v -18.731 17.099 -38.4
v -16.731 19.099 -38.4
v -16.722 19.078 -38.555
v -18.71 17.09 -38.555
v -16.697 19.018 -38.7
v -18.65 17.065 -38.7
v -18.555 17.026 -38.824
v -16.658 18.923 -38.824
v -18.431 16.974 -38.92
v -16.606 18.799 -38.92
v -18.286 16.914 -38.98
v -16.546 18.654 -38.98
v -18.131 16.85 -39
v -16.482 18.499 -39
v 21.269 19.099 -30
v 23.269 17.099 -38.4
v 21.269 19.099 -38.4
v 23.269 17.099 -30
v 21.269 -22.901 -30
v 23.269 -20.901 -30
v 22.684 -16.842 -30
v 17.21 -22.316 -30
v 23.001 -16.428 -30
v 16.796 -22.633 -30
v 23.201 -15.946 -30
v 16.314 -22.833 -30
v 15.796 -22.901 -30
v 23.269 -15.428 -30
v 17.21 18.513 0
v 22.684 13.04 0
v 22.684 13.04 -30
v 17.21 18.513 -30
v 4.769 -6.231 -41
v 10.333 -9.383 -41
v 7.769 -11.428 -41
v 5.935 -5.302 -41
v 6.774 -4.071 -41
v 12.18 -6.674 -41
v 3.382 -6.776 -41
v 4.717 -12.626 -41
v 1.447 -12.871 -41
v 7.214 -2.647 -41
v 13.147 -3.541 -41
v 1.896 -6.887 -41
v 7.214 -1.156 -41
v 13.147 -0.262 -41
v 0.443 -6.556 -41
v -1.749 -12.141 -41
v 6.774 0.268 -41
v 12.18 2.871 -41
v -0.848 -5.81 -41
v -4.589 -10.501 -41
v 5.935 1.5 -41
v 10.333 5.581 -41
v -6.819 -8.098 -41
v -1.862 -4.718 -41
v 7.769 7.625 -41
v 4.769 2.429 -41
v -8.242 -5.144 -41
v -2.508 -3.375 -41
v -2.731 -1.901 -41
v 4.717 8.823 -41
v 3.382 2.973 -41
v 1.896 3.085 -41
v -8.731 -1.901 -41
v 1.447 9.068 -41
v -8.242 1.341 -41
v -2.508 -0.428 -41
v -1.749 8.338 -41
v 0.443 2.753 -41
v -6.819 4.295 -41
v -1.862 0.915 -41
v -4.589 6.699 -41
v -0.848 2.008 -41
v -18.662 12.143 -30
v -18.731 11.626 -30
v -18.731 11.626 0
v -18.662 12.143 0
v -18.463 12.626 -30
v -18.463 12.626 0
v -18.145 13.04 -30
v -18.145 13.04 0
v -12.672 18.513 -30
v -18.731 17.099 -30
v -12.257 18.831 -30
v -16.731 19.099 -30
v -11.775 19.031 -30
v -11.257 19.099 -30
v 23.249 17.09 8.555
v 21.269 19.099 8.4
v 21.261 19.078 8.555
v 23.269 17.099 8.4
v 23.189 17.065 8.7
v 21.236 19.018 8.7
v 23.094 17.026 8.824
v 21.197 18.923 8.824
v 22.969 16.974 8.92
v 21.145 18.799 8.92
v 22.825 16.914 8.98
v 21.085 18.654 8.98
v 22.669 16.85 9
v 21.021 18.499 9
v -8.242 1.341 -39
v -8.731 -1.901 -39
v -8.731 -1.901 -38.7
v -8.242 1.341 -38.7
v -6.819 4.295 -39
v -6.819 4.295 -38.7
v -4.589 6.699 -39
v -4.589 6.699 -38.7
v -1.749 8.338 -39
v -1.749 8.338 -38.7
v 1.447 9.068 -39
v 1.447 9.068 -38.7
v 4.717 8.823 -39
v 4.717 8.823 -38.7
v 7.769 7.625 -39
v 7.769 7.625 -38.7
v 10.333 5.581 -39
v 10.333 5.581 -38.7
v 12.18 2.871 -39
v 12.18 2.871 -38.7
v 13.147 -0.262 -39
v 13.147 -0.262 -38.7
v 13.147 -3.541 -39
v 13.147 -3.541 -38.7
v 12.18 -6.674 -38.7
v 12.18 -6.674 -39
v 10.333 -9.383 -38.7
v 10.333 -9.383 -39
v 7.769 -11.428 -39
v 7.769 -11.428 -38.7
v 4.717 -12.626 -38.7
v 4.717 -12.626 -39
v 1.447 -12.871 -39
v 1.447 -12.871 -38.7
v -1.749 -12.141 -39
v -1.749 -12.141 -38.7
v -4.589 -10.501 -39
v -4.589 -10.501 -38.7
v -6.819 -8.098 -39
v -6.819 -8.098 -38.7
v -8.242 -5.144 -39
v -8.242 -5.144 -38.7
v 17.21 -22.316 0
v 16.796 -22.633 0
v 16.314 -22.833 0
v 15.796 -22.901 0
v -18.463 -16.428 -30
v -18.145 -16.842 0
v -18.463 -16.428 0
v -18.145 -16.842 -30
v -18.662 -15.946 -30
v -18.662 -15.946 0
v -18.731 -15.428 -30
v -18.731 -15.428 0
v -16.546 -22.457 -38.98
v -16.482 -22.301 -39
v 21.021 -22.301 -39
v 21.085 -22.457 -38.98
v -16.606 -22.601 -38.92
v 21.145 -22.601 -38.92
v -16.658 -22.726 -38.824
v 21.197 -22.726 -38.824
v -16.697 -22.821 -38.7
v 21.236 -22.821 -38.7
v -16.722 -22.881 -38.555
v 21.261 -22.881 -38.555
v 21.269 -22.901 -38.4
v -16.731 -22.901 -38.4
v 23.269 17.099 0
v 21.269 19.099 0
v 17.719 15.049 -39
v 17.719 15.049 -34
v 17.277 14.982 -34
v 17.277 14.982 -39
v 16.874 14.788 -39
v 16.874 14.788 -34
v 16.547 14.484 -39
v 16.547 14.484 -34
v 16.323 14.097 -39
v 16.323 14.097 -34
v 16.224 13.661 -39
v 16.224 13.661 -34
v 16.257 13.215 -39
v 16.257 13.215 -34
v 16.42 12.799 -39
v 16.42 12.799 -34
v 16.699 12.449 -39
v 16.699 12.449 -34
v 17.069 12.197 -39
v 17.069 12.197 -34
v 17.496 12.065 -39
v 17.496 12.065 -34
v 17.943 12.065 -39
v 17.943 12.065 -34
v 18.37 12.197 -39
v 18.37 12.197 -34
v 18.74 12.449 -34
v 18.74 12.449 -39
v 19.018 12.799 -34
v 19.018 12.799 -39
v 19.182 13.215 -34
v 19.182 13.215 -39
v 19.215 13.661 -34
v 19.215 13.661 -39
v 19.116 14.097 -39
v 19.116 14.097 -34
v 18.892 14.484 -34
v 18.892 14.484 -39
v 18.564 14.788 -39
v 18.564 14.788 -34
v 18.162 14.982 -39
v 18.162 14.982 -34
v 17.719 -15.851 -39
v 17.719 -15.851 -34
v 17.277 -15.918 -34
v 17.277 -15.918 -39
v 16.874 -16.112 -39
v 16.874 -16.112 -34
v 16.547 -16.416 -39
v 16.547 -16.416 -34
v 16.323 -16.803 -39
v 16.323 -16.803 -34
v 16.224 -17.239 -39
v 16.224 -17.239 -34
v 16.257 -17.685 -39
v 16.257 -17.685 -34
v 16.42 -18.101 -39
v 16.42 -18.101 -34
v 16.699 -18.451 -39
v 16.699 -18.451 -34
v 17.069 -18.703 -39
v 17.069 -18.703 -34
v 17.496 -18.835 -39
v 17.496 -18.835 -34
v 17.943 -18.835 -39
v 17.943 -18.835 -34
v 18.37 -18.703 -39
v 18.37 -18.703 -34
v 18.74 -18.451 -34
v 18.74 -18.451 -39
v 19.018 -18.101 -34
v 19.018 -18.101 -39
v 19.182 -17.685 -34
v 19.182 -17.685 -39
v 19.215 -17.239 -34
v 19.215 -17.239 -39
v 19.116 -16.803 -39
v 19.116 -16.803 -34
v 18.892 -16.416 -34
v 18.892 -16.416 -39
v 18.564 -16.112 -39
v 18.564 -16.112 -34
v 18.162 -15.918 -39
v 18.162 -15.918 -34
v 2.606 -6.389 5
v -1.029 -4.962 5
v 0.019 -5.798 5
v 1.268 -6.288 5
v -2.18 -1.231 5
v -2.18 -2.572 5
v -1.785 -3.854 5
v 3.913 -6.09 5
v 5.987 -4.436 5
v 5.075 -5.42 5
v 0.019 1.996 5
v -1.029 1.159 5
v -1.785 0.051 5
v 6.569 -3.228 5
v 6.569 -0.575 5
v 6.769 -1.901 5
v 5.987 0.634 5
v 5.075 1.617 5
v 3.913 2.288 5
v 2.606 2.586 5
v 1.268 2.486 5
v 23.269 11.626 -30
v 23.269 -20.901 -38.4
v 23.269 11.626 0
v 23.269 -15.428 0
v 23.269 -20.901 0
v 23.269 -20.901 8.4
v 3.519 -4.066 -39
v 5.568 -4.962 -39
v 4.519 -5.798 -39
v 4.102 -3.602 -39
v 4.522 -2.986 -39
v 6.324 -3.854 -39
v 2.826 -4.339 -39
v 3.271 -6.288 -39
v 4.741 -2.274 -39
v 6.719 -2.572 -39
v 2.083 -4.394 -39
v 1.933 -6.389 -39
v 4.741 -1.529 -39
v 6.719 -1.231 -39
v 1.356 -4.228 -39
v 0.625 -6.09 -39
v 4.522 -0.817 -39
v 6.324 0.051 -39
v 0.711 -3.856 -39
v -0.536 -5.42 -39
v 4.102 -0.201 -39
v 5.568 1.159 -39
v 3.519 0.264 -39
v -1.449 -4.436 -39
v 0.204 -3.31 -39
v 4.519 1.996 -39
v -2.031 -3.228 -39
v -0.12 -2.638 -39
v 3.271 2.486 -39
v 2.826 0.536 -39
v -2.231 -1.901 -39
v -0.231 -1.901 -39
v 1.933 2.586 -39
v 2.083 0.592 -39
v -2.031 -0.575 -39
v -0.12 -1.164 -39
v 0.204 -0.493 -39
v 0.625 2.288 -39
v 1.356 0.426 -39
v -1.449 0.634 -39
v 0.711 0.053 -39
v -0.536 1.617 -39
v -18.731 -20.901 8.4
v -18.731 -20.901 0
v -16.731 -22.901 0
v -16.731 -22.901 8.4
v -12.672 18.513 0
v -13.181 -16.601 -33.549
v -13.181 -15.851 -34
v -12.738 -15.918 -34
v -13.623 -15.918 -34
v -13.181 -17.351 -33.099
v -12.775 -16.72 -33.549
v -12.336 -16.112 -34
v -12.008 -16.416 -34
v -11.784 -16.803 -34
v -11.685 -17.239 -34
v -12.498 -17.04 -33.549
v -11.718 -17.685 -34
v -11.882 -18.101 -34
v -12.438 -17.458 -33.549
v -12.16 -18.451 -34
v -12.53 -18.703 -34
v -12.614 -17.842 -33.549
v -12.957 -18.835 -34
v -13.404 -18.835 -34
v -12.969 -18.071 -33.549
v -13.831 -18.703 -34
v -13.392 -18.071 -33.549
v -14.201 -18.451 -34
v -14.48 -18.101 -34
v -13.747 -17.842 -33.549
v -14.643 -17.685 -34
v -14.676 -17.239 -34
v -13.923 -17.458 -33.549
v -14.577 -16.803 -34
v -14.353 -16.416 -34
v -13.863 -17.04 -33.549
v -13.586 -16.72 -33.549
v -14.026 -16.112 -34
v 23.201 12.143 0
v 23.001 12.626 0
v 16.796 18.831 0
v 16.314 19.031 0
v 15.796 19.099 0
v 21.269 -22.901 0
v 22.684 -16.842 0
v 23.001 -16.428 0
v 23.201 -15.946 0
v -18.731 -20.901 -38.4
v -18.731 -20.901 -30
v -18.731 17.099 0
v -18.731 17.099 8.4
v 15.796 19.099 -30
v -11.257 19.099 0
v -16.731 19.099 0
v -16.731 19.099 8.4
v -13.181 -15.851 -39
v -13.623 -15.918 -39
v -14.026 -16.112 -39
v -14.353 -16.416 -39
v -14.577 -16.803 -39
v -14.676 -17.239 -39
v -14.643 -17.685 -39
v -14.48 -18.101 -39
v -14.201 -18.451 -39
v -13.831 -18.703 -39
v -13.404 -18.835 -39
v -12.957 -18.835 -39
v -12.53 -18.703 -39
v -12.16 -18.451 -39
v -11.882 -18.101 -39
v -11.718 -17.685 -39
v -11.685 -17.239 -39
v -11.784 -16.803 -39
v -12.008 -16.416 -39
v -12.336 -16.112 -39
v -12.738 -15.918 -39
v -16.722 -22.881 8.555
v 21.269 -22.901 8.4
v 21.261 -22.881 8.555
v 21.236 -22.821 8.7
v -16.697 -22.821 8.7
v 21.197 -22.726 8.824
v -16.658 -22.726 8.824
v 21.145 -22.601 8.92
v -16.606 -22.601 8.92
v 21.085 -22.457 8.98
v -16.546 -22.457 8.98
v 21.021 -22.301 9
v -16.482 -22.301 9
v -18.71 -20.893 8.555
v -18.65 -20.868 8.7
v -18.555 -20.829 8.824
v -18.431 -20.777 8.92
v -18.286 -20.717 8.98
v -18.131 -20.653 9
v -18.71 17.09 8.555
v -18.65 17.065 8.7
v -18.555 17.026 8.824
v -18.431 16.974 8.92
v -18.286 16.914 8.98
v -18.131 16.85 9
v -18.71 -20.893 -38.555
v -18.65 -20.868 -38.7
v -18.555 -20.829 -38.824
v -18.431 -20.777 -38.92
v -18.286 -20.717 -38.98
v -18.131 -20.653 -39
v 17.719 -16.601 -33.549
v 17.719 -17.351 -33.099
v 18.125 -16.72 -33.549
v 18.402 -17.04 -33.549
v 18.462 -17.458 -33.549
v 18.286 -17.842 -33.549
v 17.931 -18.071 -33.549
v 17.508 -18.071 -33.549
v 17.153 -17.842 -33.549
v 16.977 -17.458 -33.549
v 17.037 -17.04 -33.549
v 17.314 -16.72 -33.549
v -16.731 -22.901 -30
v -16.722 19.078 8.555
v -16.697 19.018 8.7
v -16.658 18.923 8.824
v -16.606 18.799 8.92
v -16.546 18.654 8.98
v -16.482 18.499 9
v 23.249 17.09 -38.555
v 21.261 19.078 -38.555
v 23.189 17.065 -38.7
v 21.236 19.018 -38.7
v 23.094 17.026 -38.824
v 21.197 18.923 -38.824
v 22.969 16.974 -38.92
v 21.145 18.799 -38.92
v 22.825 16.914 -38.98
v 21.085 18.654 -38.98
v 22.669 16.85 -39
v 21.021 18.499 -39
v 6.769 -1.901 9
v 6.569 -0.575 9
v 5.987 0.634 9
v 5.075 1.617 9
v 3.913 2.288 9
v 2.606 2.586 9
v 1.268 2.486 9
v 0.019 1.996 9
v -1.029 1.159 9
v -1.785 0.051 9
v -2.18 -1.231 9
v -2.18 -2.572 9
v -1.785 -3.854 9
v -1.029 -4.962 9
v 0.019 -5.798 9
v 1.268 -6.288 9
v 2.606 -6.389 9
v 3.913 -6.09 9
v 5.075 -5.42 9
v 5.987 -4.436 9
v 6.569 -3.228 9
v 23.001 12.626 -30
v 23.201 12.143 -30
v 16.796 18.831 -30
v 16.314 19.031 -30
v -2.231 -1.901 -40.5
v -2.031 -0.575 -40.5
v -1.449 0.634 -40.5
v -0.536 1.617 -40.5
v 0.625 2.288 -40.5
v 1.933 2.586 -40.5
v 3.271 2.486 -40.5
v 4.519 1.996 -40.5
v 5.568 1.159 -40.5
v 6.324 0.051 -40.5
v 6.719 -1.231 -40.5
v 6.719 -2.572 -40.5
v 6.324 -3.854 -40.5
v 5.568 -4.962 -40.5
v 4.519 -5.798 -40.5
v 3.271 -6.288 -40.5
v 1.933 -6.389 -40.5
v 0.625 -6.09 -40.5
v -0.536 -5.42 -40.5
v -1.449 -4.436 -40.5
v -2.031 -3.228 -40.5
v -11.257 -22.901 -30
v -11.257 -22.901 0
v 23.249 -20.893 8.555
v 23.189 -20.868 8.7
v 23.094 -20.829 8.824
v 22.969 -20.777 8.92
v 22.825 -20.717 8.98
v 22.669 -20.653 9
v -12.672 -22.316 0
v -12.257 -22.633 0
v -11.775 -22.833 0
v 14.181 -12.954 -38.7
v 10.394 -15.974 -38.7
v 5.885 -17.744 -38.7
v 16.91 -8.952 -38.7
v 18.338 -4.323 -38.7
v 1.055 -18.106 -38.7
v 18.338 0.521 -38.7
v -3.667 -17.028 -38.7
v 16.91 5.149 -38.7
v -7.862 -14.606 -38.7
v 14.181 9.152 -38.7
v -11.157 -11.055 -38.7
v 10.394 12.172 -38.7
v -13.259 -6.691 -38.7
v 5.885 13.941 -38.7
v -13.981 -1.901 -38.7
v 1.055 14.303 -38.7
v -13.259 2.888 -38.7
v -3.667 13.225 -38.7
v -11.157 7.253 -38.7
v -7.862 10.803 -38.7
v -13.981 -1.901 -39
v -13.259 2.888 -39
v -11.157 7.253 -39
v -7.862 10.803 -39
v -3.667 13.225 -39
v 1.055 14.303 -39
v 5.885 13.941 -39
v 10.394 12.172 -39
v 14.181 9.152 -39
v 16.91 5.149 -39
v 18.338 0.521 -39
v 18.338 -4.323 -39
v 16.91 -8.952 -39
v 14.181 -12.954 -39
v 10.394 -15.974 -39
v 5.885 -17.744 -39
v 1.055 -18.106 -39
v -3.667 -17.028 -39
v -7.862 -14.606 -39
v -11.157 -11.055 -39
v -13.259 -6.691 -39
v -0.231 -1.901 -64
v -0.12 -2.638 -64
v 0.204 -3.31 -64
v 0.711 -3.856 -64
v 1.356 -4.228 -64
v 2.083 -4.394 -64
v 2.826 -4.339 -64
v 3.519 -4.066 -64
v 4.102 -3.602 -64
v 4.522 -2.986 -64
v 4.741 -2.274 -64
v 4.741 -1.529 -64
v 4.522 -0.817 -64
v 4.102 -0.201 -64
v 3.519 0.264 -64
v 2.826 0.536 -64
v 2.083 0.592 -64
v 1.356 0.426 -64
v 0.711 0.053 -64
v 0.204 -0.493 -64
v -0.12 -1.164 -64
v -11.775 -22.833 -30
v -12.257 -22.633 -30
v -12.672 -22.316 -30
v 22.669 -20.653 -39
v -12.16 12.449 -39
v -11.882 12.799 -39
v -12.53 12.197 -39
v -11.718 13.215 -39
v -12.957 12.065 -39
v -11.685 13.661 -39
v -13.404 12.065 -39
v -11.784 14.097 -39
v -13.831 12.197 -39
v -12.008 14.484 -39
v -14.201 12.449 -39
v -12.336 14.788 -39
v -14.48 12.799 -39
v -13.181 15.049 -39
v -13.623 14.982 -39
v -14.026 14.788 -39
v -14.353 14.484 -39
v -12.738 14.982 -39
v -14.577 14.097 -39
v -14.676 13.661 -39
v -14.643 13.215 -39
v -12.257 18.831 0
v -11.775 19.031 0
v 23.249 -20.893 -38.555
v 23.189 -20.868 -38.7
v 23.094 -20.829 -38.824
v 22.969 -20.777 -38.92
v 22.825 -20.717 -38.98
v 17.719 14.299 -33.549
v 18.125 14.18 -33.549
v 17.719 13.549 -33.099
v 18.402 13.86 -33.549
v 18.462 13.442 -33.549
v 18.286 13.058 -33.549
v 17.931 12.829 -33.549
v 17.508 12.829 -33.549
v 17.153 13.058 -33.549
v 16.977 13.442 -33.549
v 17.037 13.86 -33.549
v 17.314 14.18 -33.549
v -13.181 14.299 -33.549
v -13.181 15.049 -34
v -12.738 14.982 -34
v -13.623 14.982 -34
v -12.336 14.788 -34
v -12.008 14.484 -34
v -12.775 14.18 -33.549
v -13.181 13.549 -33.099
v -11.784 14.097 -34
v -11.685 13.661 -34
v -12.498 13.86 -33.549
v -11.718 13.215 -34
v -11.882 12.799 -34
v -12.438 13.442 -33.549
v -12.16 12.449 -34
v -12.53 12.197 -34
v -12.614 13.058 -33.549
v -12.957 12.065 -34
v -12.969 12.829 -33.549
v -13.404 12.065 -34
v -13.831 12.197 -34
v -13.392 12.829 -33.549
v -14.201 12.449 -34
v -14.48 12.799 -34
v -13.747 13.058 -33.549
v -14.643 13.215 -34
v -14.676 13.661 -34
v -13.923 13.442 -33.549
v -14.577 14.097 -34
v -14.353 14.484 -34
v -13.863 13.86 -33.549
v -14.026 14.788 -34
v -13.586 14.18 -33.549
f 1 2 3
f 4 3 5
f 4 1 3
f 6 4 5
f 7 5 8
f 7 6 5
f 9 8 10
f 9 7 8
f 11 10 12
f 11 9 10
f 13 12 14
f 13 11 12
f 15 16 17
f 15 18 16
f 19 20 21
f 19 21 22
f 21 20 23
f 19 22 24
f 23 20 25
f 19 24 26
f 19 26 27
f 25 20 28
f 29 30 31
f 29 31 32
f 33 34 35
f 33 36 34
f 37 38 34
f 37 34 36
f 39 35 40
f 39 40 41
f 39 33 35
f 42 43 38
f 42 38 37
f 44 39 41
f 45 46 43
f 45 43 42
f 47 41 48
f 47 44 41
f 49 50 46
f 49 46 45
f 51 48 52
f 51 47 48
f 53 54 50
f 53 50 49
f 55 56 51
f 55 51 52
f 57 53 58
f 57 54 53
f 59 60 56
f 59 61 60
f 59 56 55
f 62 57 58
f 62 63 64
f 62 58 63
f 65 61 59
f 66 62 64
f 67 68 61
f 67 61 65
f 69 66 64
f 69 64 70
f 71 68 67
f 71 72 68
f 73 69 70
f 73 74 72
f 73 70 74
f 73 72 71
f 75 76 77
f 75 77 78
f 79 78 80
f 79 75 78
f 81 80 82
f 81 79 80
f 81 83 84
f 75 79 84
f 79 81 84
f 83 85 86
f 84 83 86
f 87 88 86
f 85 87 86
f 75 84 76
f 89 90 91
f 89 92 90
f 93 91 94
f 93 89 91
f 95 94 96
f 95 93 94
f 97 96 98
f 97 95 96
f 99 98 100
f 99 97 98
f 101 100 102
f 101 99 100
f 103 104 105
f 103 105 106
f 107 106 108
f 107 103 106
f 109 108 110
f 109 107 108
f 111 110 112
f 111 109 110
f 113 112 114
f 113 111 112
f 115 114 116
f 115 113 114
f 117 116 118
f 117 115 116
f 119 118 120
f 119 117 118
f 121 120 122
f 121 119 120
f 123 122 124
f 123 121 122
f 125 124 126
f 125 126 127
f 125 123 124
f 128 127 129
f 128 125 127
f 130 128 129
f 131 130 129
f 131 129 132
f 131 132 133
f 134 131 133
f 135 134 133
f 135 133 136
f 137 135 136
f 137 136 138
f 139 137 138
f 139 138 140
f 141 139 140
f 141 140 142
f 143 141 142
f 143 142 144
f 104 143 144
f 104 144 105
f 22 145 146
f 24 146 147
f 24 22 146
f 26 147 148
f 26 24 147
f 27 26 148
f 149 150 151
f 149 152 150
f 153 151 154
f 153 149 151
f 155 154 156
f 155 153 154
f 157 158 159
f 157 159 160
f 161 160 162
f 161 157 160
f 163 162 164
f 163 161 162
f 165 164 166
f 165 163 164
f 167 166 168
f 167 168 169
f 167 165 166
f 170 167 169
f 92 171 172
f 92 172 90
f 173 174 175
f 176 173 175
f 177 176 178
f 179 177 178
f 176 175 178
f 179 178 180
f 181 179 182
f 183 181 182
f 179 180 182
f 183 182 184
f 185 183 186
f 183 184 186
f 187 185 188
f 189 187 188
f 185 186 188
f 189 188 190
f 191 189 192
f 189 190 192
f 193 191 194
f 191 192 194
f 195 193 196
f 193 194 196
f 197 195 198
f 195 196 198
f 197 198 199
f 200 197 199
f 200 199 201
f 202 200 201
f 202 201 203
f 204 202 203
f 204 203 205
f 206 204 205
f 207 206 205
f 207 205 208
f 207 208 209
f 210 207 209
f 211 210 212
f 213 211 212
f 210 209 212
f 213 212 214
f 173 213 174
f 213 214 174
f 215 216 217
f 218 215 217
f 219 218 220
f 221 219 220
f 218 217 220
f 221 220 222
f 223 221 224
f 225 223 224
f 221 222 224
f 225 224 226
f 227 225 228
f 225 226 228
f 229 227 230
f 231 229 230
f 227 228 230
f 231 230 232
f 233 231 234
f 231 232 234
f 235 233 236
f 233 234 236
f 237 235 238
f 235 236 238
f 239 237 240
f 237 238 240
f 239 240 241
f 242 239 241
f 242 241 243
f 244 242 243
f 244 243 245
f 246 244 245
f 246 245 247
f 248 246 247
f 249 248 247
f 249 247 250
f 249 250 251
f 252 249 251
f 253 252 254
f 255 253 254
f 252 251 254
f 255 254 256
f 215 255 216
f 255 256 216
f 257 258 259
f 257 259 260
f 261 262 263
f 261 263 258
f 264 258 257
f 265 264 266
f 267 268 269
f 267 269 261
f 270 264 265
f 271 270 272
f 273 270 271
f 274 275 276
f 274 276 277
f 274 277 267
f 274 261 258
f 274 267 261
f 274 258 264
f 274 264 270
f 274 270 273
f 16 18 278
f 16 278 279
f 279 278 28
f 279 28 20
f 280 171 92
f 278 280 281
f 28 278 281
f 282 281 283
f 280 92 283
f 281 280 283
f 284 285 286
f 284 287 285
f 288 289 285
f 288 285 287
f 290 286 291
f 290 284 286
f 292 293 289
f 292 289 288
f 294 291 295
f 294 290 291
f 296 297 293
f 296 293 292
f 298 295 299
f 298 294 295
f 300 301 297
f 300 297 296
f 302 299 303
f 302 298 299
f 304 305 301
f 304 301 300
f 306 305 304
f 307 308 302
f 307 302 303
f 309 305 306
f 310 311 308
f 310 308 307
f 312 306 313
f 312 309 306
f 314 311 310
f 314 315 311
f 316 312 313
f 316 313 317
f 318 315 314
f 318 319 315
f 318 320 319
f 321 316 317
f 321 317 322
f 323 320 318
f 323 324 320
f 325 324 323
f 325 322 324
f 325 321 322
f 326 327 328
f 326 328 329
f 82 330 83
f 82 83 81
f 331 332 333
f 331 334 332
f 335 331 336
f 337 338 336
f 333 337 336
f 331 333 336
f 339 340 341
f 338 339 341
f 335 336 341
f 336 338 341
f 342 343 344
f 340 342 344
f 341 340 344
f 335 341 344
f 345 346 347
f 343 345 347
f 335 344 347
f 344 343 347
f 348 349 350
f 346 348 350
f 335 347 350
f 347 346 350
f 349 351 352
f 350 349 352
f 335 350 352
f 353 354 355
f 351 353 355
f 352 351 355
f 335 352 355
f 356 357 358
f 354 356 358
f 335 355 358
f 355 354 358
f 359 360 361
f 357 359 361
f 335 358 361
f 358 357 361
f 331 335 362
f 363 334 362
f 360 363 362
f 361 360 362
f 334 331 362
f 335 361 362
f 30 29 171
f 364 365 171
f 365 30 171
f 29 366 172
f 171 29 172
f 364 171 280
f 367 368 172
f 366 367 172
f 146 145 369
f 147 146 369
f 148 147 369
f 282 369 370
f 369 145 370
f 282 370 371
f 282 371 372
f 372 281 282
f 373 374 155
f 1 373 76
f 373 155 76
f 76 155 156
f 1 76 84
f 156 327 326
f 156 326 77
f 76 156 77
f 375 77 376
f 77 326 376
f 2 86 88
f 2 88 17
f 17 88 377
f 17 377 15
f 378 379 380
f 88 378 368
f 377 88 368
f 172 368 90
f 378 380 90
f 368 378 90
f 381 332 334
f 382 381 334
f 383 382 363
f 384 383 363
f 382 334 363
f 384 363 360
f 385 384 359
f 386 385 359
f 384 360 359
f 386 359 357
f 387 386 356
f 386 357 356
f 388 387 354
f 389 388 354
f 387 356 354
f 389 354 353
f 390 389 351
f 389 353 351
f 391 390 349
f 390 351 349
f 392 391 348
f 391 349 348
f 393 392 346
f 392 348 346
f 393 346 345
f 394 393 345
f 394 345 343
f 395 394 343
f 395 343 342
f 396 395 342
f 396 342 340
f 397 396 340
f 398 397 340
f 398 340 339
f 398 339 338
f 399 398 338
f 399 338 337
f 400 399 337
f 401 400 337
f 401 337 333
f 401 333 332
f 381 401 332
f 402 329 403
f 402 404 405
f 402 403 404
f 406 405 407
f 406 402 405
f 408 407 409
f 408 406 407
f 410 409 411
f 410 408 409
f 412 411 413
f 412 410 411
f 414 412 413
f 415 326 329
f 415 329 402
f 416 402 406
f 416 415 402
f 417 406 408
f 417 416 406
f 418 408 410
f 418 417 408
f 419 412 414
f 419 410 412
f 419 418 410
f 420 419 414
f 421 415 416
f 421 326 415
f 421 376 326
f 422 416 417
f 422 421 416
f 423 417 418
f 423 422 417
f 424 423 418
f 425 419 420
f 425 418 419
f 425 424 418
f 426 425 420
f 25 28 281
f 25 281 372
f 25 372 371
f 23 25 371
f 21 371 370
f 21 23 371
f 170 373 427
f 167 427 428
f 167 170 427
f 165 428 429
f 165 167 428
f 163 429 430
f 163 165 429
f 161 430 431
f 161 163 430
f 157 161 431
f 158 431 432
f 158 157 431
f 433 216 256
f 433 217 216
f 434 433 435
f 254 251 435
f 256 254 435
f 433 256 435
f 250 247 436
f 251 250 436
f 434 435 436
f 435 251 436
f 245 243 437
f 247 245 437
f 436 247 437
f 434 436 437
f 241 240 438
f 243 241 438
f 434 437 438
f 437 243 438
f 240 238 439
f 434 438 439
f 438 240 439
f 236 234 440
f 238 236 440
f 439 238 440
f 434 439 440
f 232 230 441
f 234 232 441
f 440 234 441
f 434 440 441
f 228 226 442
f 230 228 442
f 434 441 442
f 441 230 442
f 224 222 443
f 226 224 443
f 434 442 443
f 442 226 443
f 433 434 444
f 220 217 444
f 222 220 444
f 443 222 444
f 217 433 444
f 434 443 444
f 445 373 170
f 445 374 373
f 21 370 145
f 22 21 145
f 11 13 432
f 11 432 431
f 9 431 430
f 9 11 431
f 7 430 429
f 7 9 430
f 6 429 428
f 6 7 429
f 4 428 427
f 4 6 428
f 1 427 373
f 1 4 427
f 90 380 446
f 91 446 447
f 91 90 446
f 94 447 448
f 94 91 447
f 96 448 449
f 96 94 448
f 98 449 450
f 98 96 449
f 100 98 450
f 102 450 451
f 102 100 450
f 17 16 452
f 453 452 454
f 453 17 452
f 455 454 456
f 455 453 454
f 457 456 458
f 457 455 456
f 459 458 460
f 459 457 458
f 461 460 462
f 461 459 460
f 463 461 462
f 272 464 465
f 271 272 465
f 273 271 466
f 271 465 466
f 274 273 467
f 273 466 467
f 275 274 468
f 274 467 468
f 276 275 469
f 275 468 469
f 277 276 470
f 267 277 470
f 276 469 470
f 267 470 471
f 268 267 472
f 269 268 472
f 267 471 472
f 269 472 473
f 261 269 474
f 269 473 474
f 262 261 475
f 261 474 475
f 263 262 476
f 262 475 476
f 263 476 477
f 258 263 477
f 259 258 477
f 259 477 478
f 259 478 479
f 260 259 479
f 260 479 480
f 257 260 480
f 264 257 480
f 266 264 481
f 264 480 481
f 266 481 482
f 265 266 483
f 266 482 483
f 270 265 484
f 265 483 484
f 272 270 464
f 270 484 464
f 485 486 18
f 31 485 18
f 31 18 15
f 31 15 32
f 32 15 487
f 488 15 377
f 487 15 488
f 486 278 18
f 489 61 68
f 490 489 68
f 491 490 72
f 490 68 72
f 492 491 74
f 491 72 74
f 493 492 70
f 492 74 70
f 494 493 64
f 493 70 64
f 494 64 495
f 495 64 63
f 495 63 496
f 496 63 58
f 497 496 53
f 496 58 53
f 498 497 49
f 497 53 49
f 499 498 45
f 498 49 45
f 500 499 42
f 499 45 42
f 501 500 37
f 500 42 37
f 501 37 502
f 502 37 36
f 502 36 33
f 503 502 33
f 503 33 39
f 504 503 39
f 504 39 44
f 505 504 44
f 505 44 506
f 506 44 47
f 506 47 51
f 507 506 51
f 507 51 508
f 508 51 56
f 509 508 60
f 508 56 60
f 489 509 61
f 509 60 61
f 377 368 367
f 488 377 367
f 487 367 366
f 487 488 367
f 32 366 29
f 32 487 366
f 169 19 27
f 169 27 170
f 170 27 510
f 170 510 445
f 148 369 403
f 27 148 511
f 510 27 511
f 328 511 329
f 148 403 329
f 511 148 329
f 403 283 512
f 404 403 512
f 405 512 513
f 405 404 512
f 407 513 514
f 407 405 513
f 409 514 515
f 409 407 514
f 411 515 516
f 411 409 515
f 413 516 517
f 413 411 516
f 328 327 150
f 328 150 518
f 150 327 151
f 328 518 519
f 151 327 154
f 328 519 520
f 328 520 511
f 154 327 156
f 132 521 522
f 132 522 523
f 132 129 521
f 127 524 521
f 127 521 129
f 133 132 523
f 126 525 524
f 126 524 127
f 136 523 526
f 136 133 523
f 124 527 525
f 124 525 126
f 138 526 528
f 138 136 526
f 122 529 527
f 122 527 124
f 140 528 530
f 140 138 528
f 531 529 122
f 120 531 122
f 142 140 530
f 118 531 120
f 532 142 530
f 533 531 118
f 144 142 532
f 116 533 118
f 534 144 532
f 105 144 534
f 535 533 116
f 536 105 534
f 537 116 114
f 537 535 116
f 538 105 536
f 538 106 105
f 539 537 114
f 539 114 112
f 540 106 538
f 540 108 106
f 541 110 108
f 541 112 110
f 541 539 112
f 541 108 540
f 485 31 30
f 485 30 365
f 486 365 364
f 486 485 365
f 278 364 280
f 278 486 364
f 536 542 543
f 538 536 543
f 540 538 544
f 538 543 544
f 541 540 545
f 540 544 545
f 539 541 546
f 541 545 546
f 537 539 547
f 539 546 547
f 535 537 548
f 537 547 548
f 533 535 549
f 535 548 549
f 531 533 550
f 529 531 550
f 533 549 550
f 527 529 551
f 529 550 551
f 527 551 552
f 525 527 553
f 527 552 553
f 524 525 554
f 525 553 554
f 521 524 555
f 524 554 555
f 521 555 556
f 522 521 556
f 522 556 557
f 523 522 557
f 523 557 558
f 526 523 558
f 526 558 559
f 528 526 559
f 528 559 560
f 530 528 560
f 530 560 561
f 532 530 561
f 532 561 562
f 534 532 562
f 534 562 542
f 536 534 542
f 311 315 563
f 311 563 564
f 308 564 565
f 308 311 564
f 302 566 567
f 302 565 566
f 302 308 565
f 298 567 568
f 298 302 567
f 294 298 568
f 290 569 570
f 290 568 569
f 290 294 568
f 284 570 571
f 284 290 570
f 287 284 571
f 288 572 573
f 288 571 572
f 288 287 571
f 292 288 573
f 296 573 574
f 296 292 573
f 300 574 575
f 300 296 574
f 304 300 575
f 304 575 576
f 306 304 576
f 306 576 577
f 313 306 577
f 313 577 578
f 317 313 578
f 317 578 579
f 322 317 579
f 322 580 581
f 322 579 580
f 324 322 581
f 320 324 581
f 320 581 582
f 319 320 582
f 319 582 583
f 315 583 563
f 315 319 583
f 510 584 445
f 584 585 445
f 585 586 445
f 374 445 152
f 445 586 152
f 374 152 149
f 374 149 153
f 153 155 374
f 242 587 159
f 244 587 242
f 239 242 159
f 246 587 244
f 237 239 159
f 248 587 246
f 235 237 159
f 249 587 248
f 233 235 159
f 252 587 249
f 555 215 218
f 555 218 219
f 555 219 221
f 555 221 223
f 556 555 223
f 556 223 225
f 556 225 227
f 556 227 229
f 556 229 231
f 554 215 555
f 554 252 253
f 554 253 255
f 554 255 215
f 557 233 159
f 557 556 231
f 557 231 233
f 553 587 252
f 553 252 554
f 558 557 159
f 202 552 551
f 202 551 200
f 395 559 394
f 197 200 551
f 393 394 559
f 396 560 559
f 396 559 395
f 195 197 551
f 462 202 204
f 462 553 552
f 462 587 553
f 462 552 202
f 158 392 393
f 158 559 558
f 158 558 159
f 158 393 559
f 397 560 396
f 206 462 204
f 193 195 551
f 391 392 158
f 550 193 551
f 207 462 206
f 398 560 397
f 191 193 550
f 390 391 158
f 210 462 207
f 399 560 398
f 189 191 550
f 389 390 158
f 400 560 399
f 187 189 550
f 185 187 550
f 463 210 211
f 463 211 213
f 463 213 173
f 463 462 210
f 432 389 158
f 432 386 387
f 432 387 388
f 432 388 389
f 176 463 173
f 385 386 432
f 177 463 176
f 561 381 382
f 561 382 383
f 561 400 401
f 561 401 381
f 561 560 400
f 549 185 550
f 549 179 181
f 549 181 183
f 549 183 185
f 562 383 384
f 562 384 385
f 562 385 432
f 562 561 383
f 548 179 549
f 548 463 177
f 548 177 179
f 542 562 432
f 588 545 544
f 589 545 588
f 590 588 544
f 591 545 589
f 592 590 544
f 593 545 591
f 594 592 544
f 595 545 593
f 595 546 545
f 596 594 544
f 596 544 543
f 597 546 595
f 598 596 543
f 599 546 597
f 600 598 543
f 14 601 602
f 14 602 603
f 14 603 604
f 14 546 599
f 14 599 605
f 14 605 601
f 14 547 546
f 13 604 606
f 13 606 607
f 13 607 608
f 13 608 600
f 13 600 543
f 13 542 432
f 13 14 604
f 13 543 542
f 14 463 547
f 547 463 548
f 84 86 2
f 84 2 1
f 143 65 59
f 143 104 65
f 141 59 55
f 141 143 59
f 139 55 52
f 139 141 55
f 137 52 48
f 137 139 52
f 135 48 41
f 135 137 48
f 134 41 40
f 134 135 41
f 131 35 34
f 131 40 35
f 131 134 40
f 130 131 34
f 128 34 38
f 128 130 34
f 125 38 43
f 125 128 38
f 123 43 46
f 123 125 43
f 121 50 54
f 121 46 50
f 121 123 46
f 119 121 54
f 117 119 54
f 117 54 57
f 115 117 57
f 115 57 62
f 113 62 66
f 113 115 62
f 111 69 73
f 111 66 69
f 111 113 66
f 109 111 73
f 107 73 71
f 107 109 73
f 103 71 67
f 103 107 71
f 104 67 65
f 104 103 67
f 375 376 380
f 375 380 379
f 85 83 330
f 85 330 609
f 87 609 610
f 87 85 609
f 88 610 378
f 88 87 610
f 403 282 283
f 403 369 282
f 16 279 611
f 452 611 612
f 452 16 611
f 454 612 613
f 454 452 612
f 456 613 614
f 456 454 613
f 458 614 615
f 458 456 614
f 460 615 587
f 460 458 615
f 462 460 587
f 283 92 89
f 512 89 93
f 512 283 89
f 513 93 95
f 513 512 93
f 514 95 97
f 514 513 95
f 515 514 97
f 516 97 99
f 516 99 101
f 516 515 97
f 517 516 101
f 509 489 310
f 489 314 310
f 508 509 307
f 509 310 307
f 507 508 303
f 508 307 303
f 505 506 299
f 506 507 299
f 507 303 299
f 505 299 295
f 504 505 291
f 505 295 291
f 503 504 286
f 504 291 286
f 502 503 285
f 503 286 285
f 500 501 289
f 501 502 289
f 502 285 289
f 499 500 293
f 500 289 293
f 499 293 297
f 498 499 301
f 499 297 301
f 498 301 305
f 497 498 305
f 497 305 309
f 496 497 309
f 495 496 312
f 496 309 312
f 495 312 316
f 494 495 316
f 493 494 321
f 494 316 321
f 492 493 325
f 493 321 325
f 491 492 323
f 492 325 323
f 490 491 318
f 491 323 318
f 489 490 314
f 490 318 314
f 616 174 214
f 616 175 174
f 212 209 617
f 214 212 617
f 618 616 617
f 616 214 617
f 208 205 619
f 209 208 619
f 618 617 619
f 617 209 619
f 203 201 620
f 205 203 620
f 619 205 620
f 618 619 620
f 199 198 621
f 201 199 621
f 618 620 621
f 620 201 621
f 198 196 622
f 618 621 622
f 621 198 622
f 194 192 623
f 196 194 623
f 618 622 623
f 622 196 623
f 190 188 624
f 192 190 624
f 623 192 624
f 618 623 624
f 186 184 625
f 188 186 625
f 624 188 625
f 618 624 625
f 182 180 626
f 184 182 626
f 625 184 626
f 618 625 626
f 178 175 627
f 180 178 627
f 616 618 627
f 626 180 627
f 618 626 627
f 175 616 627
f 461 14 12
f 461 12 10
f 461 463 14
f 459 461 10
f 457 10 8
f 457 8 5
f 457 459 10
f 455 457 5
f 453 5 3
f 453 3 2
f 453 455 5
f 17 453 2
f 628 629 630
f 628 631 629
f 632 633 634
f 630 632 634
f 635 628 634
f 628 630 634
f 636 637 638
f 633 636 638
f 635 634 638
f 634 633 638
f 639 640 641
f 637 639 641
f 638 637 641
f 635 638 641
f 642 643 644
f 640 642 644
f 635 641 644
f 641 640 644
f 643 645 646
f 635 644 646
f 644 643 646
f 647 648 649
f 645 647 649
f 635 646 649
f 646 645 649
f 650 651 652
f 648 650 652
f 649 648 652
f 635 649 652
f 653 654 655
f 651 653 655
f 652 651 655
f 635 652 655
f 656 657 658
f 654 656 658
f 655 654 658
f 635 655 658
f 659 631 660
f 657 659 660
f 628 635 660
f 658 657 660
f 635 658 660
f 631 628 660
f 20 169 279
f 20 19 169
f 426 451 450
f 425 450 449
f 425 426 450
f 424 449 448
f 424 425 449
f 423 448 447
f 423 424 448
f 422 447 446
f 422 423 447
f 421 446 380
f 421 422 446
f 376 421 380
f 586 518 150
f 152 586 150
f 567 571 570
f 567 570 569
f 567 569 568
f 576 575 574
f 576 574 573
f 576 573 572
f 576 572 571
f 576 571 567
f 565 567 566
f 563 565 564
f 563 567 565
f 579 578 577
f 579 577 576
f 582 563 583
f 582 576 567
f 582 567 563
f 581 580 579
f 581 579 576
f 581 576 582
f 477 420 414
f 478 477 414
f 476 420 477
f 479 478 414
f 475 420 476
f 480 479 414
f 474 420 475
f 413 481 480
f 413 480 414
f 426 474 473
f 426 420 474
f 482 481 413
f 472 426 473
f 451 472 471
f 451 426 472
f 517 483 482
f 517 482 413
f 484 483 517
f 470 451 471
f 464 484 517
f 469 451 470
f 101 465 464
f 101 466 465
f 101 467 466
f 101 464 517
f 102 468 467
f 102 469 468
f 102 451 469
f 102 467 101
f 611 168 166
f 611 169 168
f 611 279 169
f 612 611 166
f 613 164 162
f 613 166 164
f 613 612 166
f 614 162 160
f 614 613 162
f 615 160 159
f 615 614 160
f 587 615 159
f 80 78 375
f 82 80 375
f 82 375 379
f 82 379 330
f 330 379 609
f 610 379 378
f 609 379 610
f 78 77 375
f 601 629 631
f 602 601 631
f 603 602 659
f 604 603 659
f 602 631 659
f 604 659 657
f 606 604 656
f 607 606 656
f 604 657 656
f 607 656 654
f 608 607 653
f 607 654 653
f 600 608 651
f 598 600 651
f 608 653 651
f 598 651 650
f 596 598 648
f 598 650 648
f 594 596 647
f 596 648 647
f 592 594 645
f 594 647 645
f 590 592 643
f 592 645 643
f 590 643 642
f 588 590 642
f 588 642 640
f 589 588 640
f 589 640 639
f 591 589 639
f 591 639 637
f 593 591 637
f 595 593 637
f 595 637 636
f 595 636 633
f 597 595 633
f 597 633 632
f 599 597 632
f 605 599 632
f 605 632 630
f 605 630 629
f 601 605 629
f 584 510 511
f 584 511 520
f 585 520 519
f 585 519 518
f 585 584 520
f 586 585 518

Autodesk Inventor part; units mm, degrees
ref_plane "YZ Plane" through (0, 0, 0) normal (1, 0, 0) x (0, 1, 0)
ref_plane "XZ Plane" through (0, 0, 0) normal (0, 1, 0) x (-1, 0, 0)
ref_plane "XY Plane" through (0, 0, 0) normal (0, 0, 1) x (1, 0, 0)
sketch "Szkic1" plane through (0, 0, 0) normal (0, 0, 1) x (1, 0, 0)
  line L0 (-18.7306, 19.0987) -> (23.2694, 19.0987)
  line L1 (23.2694, 19.0987) -> (23.2694, -22.9013)
  line L2 (23.2694, -22.9013) -> (-18.7306, -22.9013)
  line L3 (-18.7306, -22.9013) -> (-18.7306, 19.0987)
  point P0 (0, 0)
  dimension "d0" = 42
  dimension "d1" = 42
extrude "Wyciągnięcie proste1" add sketch "Szkic1" along normal blind 9
chamfer "Faza1" distance 2 angle 45 4 edges at (23.2694, 19.0987, 4.5) (-18.7306, 19.0987, 4.5) (-18.7306, -22.9013, 4.5) (23.2694, -22.9013, 4.5)
sketch "Szkic2" plane through (0, 0, 0) normal (0, 0, -1) x (-1, 0, 0)
  line L0 (-21.2694, -22.9013) -> (-23.2694, -20.9013) projected
  line L1 (-21.2694, -22.9013) -> (16.7306, -22.9013) projected
  line L2 (18.7306, -20.9013) -> (16.7306, -22.9013) projected
  line L3 (18.7306, -20.9013) -> (18.7306, 17.0987) projected
  line L4 (16.7306, 19.0987) -> (18.7306, 17.0987) projected
  line L5 (16.7306, 19.0987) -> (-21.2694, 19.0987) projected
  line L6 (-23.2694, 17.0987) -> (-21.2694, 19.0987) projected
  line L7 (-23.2694, 17.0987) -> (-23.2694, -20.9013) projected
  line L8 (12.0859, 19.0987) -> (-16.6247, 19.0987)
  line L9 (-23.2694, -16.2567) -> (-16.6247, -22.9013)
  line L10 (12.0859, -22.9013) -> (18.7306, -16.2567)
  line L11 (-23.2694, 12.454) -> (-16.6247, 19.0987)
  line L12 (12.0859, 19.0987) -> (18.7306, 12.454)
  line L13 (-16.6247, 19.0987) -> (12.0859, 19.0987)
  line L14 (-23.2694, 17.0987) -> (-23.2694, -20.9013) projected
  line L15 (-23.2694, 12.454) -> (-23.2694, -16.2567)
  line L16 (-23.2694, -16.2567) -> (-23.2694, 12.454)
  line L17 (-16.6247, -22.9013) -> (12.0859, -22.9013)
  line L18 (-16.6247, -22.9013) -> (12.0859, -22.9013)
  line L19 (18.7306, -16.2567) -> (18.7306, 12.454)
  point P0 (0, 0)
  point P1 (-2.2694, -1.9013)
  dimension "d9" = 21
  dimension "d10" = 42
  dimension "d11" = 21
  dimension "d12" = 25
  dimension "d13" = 25
  dimension "d14" = 25
  dimension "d15" = 25
extrude "Wyciągnięcie proste3" add sketch "Szkic2" along normal blind 30 contours L9 L7 L11 L5 L12 L3 L10 L1
sketch "Szkic3" plane through (0, 0, -30) normal (0, 0, -1) x (-1, 0, 0)
  line L0 (-23.2694, -16.2567) -> (-16.6247, -22.9013) projected
  line L1 (-16.6247, -22.9013) -> (12.0859, -22.9013) projected
  line L2 (12.0859, -22.9013) -> (18.7306, -16.2567) projected
  line L3 (18.7306, -16.2567) -> (18.7306, 12.454) projected
  line L4 (18.7306, 12.454) -> (12.0859, 19.0987) projected
  line L5 (12.0859, 19.0987) -> (-16.6247, 19.0987) projected
  line L6 (-16.6247, 19.0987) -> (-23.2694, 12.454) projected
  line L7 (-23.2694, 12.454) -> (-23.2694, -16.2567) projected
  line L8 (-23.2694, 12.454) -> (-16.6247, 19.0987) projected
  line L9 (-16.6247, 19.0987) -> (-21.2694, 19.0987) projected
  line L10 (-23.2694, 17.0987) -> (-21.2694, 19.0987) projected
  line L11 (-23.2694, 17.0987) -> (-23.2694, 12.454) projected
  line L12 (-16.6247, -22.9013) -> (-23.2694, -16.2567) projected
  line L13 (-23.2694, -16.2567) -> (-23.2694, -20.9013) projected
  line L14 (-21.2694, -22.9013) -> (-23.2694, -20.9013) projected
  line L15 (-21.2694, -22.9013) -> (-16.6247, -22.9013) projected
  line L16 (18.7306, -16.2567) -> (12.0859, -22.9013) projected
  line L17 (12.0859, -22.9013) -> (16.7306, -22.9013) projected
  line L18 (18.7306, -20.9013) -> (16.7306, -22.9013) projected
  line L19 (18.7306, -20.9013) -> (18.7306, -16.2567) projected
  line L20 (12.0859, 19.0987) -> (18.7306, 12.454) projected
  line L21 (18.7306, 12.454) -> (18.7306, 17.0987) projected
  line L22 (16.7306, 19.0987) -> (18.7306, 17.0987) projected
  line L23 (16.7306, 19.0987) -> (12.0859, 19.0987) projected
  line L24 (-23.2694, 19.0987) -> (-23.2694, -22.9013)
  line L25 (-23.2694, -22.9013) -> (18.7306, -22.9013)
  line L26 (18.7306, -22.9013) -> (18.7306, 19.0987)
  line L27 (18.7306, 19.0987) -> (-23.2694, 19.0987)
  point P0 (0, 0)
extrude "Wyciągnięcie proste4" add sketch "Szkic3" along normal blind 9 contours L7 L6 L5 L4 L3 L2 L1 L0 | L0 L15 L14 L13 | L11 L10 L9 L6 | L2 L19 L18 L17 | L23 L22 L21 L4
fillet "Zaokrąglenie1" radius 2 8 edges at (-18.7306, 12.454, -15) (-12.0859, 19.0987, -15) (16.6247, 19.0987, -15) (23.2694, 12.454, -15) (-18.7306, -16.2567, -15) (-12.0859, -22.9013, -15) (16.6247, -22.9013, -15) (23.2694, -16.2567, -15)
sketch "Szkic4" plane through (0, 0, 9) normal (0, 0, 1) x (1, 0, 0)
  line L0 (-18.7306, 17.0987) -> (-18.7306, -20.9013) projected
  line L1 (23.2694, -20.9013) -> (23.2694, 17.0987) projected
  line L2 (21.2694, 19.0987) -> (-16.7306, 19.0987) projected
  circle A0 centre (2.2694, -1.9013) radius 4.5
  line L3 (23.2694, 19.0987) -> (-18.7306, 19.0987)
  line L4 (23.2694, -22.9013) -> (-18.7306, -22.9013)
  line L5 (21.2694, -22.9013) -> (-16.7306, -22.9013) projected
  line L6 (-18.7306, -22.9013) -> (-18.7306, 19.0987)
  line L7 (23.2694, 19.0987) -> (23.2694, -22.9013)
  point P0 (0, 0)
  dimension "d21" = 42
  dimension "d22" = 21
  dimension "d23" = 21
  dimension "d24" = 9
extrude "Wyciągnięcie proste5" cut sketch "Szkic4" against normal blind 4 contours A0
fillet "Zaokrąglenie2" radius 0.6 16 edges at (23.2694, -1.9013, 9) (2.2694, -22.9013, 9) (-18.7306, -1.9013, 9) (2.2694, 19.0987, 9) (22.2694, -21.9013, 9) (-17.7306, -21.9013, 9) (-17.7306, 18.0987, 9) (22.2694, 18.0987, 9) (23.2694, -1.9013, -39) (22.2694, 18.0987, -39) (2.2694, 19.0987, -39) (-17.7306, 18.0987, -39) (-18.7306, -1.9013, -39) (-17.7306, -21.9013, -39) (2.2694, -22.9013, -39) (22.2694, -21.9013, -39)
sketch "Szkic5" plane through (0, 0, -39) normal (0, 0, -1) x (-1, 0, 0)
  circle A0 centre (-2.2694, -1.9013) radius 4.5 projected
  line L0 (-21.2694, -22.9013) -> (16.7306, -22.9013) projected
  line L1 (16.7306, -22.9013) -> (18.7306, -20.9013) projected
  line L2 (18.7306, -20.9013) -> (18.7306, 17.0987) projected
  line L3 (18.7306, 17.0987) -> (16.7306, 19.0987) projected
  line L4 (16.7306, 19.0987) -> (-21.2694, 19.0987) projected
  line L5 (-21.2694, 19.0987) -> (-23.2694, 17.0987) projected
  line L6 (-23.2694, 17.0987) -> (-23.2694, -20.9013) projected
  line L7 (-23.2694, -20.9013) -> (-21.2694, -22.9013) projected
  line L8 (18.7306, -22.9013) -> (18.7306, 19.0987)
  line L9 (18.7306, 19.0987) -> (-23.2694, 19.0987)
  line L10 (-23.2694, 19.0987) -> (-23.2694, -22.9013)
  line L11 (-23.2694, -22.9013) -> (18.7306, -22.9013)
  circle A1 centre (-2.2694, -1.9013) radius 11
  circle A2 centre (-2.2694, -1.9013) radius 16.25
  circle A3 centre (-2.2694, -1.9013) radius 2.5
  point P0 (0, 0)
  point P1 (13.1806, -17.3513)
  point P2 (13.1806, 13.5487)
  point P3 (-17.7194, 13.5487)
  point P4 (-17.7194, -17.3513)
  dimension "d28" = 42
  dimension "d29" = 5.55
  dimension "d30" = 5.55
  dimension "d31" = 5.55
  dimension "d32" = 5.55
  dimension "d33" = 5.55
  dimension "d34" = 5.55
  dimension "d35" = 5.55
  dimension "d36" = 5.55
  dimension "d37" = 22
  dimension "d38" = 32.5
  dimension "d53" = 5
extrude "Wyciągnięcie proste6" cut sketch "Szkic5" against normal blind 0.3 contours A2
extrude "Wyciągnięcie proste7" add sketch "Szkic5" along normal blind 2 contours A1
chamfer "Faza2" distance 0.5 angle 45 1 edges at (6.7694, -1.9013, -41)
hole "Otwór1" at (-13.1806, -17.3513, -39) at (-13.1806, 13.5487, -39) at (17.7194, 13.5487, -39) at (17.7194, -17.3513, -39) direction (0, 0, 1) diameter 3 depth 5 tip angle 118
extrude "Wyciągnięcie proste8" add sketch "Szkic5" along normal blind 25 contours A3
equation "\"d13\" = d12"
equation "\"d14\" = d12"
equation "\"d15\" = d12"
equation "\"d22\" = 0.5 * d21"
equation "\"d23\" = 0.5 * d21"
equation "\"d30\" = d29"
equation "\"d31\" = d29"
equation "\"d32\" = d29"
equation "\"d33\" = d31"
equation "\"d34\" = d29"
equation "\"d35\" = d29"
equation "\"d36\" = d29"
properties part number "COTS_GENERIC_NEMA17_25mm_shaft"
